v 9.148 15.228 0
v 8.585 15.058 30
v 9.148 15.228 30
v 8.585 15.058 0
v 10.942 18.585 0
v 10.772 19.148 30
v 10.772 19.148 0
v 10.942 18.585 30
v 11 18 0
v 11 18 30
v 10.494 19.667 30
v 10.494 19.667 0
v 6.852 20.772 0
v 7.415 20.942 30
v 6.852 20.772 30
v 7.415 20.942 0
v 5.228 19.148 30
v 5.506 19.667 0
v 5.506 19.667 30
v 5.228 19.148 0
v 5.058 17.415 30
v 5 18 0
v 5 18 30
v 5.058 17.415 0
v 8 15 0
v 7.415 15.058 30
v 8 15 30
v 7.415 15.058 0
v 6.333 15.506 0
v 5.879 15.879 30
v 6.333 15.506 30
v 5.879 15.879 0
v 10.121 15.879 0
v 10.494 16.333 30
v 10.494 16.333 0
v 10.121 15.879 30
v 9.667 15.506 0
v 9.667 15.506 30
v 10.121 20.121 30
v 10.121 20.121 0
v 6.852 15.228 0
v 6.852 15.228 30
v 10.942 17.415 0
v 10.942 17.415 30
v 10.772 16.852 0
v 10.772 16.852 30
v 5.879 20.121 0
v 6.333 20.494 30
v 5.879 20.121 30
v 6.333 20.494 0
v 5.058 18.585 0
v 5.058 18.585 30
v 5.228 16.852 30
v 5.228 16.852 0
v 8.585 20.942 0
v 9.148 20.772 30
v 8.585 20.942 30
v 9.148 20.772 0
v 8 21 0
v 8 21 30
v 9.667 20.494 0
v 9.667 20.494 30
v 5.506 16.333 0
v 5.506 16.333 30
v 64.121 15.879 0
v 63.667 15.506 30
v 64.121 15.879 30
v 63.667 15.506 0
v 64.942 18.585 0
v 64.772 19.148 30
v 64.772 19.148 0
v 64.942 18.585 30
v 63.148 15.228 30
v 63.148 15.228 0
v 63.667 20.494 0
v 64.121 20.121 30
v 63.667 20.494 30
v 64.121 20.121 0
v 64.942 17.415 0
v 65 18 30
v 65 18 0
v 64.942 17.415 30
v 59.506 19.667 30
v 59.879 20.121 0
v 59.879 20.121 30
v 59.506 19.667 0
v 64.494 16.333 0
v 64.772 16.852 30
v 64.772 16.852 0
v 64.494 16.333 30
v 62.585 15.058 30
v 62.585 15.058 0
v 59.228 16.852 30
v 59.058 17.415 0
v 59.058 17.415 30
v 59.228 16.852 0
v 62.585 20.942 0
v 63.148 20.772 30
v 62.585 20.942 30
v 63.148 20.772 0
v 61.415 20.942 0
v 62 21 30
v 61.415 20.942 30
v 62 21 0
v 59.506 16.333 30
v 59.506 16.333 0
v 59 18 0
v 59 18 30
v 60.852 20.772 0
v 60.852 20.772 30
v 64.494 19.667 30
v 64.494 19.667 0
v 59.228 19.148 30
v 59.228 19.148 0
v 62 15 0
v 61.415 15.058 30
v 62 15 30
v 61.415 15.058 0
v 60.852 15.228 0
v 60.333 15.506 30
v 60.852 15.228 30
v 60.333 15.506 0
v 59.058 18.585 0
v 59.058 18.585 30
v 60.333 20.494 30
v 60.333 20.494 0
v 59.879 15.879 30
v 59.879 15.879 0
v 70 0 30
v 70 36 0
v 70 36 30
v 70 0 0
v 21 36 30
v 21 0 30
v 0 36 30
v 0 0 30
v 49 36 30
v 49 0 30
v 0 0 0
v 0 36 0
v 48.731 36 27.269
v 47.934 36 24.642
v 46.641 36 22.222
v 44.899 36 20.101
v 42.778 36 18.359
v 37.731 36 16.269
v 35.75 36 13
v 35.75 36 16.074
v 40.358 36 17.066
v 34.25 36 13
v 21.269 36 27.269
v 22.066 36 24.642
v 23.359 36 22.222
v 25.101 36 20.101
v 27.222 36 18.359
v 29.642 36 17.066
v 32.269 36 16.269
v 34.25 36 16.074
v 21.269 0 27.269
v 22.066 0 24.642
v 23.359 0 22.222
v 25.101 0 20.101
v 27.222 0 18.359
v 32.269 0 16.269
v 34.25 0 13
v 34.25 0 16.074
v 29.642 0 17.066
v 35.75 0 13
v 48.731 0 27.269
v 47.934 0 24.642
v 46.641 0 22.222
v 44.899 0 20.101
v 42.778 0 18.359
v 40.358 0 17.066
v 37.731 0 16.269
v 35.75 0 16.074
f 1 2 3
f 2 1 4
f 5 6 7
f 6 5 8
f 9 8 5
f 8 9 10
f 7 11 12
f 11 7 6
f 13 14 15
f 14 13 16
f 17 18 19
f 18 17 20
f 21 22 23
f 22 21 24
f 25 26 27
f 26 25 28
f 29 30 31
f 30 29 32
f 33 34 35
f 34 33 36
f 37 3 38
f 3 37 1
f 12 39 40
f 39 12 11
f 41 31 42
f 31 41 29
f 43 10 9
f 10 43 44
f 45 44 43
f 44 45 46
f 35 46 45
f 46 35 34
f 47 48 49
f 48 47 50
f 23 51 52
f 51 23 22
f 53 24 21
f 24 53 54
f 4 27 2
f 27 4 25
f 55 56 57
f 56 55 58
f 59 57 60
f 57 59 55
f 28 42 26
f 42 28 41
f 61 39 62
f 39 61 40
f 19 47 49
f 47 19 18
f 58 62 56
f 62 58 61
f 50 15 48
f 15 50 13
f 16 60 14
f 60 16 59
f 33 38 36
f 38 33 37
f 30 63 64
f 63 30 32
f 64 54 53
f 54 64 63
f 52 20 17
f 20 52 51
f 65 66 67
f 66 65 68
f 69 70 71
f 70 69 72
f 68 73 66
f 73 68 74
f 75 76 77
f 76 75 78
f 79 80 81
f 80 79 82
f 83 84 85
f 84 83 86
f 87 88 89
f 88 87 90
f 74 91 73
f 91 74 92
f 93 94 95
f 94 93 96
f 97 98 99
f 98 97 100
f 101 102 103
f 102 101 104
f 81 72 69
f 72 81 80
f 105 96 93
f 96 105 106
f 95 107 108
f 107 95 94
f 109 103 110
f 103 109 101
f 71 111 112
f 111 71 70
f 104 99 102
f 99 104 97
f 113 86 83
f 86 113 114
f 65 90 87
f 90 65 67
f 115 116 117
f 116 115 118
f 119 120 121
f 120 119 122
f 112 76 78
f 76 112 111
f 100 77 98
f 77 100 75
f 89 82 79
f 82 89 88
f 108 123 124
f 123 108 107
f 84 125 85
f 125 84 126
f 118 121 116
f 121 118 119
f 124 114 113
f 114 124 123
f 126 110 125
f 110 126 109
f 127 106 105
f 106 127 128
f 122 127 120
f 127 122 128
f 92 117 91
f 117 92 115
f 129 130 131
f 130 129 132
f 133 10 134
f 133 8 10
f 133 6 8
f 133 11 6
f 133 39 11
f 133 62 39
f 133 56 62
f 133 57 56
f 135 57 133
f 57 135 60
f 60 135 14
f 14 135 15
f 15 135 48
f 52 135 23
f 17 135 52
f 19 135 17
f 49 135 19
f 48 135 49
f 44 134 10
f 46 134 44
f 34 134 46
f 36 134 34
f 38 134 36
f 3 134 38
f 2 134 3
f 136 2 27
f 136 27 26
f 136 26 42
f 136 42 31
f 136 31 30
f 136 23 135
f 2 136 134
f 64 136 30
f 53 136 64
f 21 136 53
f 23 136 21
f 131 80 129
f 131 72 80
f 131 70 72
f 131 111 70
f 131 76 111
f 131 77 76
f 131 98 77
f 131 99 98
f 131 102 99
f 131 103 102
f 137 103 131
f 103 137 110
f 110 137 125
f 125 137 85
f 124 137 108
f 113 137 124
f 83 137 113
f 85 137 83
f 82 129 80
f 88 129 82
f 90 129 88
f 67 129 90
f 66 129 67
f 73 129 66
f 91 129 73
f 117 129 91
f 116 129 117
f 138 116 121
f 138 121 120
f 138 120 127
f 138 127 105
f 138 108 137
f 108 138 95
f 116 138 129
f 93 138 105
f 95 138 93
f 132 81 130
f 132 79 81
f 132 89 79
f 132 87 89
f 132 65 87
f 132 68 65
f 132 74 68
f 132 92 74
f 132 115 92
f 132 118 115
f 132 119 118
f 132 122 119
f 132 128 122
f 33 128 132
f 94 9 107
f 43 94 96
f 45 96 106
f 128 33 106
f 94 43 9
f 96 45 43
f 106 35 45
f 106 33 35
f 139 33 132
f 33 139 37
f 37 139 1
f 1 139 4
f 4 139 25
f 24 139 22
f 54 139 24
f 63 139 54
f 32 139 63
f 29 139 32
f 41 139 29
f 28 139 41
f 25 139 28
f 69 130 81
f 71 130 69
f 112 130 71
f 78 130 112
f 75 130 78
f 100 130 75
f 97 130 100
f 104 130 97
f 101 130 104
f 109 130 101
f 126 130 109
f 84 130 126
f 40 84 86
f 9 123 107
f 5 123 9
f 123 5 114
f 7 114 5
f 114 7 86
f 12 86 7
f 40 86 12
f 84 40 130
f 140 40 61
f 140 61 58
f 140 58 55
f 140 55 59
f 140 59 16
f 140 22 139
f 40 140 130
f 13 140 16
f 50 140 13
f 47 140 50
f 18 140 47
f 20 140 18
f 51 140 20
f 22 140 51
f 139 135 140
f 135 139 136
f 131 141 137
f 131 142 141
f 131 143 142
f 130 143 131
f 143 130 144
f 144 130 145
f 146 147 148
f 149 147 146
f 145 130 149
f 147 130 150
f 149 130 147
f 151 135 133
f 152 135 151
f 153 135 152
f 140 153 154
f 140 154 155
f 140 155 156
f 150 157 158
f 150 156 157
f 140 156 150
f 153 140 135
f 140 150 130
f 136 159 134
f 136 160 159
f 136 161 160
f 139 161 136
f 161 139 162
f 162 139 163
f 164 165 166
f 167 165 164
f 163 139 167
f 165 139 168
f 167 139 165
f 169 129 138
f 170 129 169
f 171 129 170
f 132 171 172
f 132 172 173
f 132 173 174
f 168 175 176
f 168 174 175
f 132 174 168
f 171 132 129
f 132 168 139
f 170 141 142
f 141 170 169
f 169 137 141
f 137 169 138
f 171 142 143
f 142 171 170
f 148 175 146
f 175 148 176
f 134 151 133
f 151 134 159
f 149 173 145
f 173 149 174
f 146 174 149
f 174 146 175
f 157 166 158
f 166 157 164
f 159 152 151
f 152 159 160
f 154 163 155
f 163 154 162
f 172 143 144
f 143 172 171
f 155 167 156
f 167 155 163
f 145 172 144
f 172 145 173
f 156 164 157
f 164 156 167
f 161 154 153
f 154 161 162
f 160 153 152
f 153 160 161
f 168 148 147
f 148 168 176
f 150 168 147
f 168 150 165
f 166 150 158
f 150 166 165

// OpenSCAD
$fn = 32;

// ----------------------------------------------------------------------
// Saddle clamp: split shaft clamp
// ----------------------------------------------------------------------

// --- parameters (mm) ---
blk_l = 70;               // block length, X
blk_w = 36;               // block width, Y
blk_h = 30;               // block height
clamp_r = 14;             // shaft groove radius
hole_r = 3;               // bolt hole radius
hole_m = 8;               // bolt hole margin from the ends
saw_w = 1.5;              // saw kerf width

saw_depth = clamp_r + 3;  // saw kerf depth

difference() {
  cube([blk_l, blk_w, blk_h]);
  translate([blk_l / 2, -1, blk_h])
    rotate([-90, 0, 0])
      cylinder(h = blk_w + 2, r = clamp_r);
  for (sx = [0, 1])
    translate([sx ? blk_l - hole_m : hole_m, blk_w / 2, -1])
      cylinder(r = hole_r, h = blk_h + 2);
  translate([blk_l / 2 - saw_w / 2, -1, blk_h - saw_depth])
    cube([saw_w, blk_w + 2, saw_depth + 1]);
}
